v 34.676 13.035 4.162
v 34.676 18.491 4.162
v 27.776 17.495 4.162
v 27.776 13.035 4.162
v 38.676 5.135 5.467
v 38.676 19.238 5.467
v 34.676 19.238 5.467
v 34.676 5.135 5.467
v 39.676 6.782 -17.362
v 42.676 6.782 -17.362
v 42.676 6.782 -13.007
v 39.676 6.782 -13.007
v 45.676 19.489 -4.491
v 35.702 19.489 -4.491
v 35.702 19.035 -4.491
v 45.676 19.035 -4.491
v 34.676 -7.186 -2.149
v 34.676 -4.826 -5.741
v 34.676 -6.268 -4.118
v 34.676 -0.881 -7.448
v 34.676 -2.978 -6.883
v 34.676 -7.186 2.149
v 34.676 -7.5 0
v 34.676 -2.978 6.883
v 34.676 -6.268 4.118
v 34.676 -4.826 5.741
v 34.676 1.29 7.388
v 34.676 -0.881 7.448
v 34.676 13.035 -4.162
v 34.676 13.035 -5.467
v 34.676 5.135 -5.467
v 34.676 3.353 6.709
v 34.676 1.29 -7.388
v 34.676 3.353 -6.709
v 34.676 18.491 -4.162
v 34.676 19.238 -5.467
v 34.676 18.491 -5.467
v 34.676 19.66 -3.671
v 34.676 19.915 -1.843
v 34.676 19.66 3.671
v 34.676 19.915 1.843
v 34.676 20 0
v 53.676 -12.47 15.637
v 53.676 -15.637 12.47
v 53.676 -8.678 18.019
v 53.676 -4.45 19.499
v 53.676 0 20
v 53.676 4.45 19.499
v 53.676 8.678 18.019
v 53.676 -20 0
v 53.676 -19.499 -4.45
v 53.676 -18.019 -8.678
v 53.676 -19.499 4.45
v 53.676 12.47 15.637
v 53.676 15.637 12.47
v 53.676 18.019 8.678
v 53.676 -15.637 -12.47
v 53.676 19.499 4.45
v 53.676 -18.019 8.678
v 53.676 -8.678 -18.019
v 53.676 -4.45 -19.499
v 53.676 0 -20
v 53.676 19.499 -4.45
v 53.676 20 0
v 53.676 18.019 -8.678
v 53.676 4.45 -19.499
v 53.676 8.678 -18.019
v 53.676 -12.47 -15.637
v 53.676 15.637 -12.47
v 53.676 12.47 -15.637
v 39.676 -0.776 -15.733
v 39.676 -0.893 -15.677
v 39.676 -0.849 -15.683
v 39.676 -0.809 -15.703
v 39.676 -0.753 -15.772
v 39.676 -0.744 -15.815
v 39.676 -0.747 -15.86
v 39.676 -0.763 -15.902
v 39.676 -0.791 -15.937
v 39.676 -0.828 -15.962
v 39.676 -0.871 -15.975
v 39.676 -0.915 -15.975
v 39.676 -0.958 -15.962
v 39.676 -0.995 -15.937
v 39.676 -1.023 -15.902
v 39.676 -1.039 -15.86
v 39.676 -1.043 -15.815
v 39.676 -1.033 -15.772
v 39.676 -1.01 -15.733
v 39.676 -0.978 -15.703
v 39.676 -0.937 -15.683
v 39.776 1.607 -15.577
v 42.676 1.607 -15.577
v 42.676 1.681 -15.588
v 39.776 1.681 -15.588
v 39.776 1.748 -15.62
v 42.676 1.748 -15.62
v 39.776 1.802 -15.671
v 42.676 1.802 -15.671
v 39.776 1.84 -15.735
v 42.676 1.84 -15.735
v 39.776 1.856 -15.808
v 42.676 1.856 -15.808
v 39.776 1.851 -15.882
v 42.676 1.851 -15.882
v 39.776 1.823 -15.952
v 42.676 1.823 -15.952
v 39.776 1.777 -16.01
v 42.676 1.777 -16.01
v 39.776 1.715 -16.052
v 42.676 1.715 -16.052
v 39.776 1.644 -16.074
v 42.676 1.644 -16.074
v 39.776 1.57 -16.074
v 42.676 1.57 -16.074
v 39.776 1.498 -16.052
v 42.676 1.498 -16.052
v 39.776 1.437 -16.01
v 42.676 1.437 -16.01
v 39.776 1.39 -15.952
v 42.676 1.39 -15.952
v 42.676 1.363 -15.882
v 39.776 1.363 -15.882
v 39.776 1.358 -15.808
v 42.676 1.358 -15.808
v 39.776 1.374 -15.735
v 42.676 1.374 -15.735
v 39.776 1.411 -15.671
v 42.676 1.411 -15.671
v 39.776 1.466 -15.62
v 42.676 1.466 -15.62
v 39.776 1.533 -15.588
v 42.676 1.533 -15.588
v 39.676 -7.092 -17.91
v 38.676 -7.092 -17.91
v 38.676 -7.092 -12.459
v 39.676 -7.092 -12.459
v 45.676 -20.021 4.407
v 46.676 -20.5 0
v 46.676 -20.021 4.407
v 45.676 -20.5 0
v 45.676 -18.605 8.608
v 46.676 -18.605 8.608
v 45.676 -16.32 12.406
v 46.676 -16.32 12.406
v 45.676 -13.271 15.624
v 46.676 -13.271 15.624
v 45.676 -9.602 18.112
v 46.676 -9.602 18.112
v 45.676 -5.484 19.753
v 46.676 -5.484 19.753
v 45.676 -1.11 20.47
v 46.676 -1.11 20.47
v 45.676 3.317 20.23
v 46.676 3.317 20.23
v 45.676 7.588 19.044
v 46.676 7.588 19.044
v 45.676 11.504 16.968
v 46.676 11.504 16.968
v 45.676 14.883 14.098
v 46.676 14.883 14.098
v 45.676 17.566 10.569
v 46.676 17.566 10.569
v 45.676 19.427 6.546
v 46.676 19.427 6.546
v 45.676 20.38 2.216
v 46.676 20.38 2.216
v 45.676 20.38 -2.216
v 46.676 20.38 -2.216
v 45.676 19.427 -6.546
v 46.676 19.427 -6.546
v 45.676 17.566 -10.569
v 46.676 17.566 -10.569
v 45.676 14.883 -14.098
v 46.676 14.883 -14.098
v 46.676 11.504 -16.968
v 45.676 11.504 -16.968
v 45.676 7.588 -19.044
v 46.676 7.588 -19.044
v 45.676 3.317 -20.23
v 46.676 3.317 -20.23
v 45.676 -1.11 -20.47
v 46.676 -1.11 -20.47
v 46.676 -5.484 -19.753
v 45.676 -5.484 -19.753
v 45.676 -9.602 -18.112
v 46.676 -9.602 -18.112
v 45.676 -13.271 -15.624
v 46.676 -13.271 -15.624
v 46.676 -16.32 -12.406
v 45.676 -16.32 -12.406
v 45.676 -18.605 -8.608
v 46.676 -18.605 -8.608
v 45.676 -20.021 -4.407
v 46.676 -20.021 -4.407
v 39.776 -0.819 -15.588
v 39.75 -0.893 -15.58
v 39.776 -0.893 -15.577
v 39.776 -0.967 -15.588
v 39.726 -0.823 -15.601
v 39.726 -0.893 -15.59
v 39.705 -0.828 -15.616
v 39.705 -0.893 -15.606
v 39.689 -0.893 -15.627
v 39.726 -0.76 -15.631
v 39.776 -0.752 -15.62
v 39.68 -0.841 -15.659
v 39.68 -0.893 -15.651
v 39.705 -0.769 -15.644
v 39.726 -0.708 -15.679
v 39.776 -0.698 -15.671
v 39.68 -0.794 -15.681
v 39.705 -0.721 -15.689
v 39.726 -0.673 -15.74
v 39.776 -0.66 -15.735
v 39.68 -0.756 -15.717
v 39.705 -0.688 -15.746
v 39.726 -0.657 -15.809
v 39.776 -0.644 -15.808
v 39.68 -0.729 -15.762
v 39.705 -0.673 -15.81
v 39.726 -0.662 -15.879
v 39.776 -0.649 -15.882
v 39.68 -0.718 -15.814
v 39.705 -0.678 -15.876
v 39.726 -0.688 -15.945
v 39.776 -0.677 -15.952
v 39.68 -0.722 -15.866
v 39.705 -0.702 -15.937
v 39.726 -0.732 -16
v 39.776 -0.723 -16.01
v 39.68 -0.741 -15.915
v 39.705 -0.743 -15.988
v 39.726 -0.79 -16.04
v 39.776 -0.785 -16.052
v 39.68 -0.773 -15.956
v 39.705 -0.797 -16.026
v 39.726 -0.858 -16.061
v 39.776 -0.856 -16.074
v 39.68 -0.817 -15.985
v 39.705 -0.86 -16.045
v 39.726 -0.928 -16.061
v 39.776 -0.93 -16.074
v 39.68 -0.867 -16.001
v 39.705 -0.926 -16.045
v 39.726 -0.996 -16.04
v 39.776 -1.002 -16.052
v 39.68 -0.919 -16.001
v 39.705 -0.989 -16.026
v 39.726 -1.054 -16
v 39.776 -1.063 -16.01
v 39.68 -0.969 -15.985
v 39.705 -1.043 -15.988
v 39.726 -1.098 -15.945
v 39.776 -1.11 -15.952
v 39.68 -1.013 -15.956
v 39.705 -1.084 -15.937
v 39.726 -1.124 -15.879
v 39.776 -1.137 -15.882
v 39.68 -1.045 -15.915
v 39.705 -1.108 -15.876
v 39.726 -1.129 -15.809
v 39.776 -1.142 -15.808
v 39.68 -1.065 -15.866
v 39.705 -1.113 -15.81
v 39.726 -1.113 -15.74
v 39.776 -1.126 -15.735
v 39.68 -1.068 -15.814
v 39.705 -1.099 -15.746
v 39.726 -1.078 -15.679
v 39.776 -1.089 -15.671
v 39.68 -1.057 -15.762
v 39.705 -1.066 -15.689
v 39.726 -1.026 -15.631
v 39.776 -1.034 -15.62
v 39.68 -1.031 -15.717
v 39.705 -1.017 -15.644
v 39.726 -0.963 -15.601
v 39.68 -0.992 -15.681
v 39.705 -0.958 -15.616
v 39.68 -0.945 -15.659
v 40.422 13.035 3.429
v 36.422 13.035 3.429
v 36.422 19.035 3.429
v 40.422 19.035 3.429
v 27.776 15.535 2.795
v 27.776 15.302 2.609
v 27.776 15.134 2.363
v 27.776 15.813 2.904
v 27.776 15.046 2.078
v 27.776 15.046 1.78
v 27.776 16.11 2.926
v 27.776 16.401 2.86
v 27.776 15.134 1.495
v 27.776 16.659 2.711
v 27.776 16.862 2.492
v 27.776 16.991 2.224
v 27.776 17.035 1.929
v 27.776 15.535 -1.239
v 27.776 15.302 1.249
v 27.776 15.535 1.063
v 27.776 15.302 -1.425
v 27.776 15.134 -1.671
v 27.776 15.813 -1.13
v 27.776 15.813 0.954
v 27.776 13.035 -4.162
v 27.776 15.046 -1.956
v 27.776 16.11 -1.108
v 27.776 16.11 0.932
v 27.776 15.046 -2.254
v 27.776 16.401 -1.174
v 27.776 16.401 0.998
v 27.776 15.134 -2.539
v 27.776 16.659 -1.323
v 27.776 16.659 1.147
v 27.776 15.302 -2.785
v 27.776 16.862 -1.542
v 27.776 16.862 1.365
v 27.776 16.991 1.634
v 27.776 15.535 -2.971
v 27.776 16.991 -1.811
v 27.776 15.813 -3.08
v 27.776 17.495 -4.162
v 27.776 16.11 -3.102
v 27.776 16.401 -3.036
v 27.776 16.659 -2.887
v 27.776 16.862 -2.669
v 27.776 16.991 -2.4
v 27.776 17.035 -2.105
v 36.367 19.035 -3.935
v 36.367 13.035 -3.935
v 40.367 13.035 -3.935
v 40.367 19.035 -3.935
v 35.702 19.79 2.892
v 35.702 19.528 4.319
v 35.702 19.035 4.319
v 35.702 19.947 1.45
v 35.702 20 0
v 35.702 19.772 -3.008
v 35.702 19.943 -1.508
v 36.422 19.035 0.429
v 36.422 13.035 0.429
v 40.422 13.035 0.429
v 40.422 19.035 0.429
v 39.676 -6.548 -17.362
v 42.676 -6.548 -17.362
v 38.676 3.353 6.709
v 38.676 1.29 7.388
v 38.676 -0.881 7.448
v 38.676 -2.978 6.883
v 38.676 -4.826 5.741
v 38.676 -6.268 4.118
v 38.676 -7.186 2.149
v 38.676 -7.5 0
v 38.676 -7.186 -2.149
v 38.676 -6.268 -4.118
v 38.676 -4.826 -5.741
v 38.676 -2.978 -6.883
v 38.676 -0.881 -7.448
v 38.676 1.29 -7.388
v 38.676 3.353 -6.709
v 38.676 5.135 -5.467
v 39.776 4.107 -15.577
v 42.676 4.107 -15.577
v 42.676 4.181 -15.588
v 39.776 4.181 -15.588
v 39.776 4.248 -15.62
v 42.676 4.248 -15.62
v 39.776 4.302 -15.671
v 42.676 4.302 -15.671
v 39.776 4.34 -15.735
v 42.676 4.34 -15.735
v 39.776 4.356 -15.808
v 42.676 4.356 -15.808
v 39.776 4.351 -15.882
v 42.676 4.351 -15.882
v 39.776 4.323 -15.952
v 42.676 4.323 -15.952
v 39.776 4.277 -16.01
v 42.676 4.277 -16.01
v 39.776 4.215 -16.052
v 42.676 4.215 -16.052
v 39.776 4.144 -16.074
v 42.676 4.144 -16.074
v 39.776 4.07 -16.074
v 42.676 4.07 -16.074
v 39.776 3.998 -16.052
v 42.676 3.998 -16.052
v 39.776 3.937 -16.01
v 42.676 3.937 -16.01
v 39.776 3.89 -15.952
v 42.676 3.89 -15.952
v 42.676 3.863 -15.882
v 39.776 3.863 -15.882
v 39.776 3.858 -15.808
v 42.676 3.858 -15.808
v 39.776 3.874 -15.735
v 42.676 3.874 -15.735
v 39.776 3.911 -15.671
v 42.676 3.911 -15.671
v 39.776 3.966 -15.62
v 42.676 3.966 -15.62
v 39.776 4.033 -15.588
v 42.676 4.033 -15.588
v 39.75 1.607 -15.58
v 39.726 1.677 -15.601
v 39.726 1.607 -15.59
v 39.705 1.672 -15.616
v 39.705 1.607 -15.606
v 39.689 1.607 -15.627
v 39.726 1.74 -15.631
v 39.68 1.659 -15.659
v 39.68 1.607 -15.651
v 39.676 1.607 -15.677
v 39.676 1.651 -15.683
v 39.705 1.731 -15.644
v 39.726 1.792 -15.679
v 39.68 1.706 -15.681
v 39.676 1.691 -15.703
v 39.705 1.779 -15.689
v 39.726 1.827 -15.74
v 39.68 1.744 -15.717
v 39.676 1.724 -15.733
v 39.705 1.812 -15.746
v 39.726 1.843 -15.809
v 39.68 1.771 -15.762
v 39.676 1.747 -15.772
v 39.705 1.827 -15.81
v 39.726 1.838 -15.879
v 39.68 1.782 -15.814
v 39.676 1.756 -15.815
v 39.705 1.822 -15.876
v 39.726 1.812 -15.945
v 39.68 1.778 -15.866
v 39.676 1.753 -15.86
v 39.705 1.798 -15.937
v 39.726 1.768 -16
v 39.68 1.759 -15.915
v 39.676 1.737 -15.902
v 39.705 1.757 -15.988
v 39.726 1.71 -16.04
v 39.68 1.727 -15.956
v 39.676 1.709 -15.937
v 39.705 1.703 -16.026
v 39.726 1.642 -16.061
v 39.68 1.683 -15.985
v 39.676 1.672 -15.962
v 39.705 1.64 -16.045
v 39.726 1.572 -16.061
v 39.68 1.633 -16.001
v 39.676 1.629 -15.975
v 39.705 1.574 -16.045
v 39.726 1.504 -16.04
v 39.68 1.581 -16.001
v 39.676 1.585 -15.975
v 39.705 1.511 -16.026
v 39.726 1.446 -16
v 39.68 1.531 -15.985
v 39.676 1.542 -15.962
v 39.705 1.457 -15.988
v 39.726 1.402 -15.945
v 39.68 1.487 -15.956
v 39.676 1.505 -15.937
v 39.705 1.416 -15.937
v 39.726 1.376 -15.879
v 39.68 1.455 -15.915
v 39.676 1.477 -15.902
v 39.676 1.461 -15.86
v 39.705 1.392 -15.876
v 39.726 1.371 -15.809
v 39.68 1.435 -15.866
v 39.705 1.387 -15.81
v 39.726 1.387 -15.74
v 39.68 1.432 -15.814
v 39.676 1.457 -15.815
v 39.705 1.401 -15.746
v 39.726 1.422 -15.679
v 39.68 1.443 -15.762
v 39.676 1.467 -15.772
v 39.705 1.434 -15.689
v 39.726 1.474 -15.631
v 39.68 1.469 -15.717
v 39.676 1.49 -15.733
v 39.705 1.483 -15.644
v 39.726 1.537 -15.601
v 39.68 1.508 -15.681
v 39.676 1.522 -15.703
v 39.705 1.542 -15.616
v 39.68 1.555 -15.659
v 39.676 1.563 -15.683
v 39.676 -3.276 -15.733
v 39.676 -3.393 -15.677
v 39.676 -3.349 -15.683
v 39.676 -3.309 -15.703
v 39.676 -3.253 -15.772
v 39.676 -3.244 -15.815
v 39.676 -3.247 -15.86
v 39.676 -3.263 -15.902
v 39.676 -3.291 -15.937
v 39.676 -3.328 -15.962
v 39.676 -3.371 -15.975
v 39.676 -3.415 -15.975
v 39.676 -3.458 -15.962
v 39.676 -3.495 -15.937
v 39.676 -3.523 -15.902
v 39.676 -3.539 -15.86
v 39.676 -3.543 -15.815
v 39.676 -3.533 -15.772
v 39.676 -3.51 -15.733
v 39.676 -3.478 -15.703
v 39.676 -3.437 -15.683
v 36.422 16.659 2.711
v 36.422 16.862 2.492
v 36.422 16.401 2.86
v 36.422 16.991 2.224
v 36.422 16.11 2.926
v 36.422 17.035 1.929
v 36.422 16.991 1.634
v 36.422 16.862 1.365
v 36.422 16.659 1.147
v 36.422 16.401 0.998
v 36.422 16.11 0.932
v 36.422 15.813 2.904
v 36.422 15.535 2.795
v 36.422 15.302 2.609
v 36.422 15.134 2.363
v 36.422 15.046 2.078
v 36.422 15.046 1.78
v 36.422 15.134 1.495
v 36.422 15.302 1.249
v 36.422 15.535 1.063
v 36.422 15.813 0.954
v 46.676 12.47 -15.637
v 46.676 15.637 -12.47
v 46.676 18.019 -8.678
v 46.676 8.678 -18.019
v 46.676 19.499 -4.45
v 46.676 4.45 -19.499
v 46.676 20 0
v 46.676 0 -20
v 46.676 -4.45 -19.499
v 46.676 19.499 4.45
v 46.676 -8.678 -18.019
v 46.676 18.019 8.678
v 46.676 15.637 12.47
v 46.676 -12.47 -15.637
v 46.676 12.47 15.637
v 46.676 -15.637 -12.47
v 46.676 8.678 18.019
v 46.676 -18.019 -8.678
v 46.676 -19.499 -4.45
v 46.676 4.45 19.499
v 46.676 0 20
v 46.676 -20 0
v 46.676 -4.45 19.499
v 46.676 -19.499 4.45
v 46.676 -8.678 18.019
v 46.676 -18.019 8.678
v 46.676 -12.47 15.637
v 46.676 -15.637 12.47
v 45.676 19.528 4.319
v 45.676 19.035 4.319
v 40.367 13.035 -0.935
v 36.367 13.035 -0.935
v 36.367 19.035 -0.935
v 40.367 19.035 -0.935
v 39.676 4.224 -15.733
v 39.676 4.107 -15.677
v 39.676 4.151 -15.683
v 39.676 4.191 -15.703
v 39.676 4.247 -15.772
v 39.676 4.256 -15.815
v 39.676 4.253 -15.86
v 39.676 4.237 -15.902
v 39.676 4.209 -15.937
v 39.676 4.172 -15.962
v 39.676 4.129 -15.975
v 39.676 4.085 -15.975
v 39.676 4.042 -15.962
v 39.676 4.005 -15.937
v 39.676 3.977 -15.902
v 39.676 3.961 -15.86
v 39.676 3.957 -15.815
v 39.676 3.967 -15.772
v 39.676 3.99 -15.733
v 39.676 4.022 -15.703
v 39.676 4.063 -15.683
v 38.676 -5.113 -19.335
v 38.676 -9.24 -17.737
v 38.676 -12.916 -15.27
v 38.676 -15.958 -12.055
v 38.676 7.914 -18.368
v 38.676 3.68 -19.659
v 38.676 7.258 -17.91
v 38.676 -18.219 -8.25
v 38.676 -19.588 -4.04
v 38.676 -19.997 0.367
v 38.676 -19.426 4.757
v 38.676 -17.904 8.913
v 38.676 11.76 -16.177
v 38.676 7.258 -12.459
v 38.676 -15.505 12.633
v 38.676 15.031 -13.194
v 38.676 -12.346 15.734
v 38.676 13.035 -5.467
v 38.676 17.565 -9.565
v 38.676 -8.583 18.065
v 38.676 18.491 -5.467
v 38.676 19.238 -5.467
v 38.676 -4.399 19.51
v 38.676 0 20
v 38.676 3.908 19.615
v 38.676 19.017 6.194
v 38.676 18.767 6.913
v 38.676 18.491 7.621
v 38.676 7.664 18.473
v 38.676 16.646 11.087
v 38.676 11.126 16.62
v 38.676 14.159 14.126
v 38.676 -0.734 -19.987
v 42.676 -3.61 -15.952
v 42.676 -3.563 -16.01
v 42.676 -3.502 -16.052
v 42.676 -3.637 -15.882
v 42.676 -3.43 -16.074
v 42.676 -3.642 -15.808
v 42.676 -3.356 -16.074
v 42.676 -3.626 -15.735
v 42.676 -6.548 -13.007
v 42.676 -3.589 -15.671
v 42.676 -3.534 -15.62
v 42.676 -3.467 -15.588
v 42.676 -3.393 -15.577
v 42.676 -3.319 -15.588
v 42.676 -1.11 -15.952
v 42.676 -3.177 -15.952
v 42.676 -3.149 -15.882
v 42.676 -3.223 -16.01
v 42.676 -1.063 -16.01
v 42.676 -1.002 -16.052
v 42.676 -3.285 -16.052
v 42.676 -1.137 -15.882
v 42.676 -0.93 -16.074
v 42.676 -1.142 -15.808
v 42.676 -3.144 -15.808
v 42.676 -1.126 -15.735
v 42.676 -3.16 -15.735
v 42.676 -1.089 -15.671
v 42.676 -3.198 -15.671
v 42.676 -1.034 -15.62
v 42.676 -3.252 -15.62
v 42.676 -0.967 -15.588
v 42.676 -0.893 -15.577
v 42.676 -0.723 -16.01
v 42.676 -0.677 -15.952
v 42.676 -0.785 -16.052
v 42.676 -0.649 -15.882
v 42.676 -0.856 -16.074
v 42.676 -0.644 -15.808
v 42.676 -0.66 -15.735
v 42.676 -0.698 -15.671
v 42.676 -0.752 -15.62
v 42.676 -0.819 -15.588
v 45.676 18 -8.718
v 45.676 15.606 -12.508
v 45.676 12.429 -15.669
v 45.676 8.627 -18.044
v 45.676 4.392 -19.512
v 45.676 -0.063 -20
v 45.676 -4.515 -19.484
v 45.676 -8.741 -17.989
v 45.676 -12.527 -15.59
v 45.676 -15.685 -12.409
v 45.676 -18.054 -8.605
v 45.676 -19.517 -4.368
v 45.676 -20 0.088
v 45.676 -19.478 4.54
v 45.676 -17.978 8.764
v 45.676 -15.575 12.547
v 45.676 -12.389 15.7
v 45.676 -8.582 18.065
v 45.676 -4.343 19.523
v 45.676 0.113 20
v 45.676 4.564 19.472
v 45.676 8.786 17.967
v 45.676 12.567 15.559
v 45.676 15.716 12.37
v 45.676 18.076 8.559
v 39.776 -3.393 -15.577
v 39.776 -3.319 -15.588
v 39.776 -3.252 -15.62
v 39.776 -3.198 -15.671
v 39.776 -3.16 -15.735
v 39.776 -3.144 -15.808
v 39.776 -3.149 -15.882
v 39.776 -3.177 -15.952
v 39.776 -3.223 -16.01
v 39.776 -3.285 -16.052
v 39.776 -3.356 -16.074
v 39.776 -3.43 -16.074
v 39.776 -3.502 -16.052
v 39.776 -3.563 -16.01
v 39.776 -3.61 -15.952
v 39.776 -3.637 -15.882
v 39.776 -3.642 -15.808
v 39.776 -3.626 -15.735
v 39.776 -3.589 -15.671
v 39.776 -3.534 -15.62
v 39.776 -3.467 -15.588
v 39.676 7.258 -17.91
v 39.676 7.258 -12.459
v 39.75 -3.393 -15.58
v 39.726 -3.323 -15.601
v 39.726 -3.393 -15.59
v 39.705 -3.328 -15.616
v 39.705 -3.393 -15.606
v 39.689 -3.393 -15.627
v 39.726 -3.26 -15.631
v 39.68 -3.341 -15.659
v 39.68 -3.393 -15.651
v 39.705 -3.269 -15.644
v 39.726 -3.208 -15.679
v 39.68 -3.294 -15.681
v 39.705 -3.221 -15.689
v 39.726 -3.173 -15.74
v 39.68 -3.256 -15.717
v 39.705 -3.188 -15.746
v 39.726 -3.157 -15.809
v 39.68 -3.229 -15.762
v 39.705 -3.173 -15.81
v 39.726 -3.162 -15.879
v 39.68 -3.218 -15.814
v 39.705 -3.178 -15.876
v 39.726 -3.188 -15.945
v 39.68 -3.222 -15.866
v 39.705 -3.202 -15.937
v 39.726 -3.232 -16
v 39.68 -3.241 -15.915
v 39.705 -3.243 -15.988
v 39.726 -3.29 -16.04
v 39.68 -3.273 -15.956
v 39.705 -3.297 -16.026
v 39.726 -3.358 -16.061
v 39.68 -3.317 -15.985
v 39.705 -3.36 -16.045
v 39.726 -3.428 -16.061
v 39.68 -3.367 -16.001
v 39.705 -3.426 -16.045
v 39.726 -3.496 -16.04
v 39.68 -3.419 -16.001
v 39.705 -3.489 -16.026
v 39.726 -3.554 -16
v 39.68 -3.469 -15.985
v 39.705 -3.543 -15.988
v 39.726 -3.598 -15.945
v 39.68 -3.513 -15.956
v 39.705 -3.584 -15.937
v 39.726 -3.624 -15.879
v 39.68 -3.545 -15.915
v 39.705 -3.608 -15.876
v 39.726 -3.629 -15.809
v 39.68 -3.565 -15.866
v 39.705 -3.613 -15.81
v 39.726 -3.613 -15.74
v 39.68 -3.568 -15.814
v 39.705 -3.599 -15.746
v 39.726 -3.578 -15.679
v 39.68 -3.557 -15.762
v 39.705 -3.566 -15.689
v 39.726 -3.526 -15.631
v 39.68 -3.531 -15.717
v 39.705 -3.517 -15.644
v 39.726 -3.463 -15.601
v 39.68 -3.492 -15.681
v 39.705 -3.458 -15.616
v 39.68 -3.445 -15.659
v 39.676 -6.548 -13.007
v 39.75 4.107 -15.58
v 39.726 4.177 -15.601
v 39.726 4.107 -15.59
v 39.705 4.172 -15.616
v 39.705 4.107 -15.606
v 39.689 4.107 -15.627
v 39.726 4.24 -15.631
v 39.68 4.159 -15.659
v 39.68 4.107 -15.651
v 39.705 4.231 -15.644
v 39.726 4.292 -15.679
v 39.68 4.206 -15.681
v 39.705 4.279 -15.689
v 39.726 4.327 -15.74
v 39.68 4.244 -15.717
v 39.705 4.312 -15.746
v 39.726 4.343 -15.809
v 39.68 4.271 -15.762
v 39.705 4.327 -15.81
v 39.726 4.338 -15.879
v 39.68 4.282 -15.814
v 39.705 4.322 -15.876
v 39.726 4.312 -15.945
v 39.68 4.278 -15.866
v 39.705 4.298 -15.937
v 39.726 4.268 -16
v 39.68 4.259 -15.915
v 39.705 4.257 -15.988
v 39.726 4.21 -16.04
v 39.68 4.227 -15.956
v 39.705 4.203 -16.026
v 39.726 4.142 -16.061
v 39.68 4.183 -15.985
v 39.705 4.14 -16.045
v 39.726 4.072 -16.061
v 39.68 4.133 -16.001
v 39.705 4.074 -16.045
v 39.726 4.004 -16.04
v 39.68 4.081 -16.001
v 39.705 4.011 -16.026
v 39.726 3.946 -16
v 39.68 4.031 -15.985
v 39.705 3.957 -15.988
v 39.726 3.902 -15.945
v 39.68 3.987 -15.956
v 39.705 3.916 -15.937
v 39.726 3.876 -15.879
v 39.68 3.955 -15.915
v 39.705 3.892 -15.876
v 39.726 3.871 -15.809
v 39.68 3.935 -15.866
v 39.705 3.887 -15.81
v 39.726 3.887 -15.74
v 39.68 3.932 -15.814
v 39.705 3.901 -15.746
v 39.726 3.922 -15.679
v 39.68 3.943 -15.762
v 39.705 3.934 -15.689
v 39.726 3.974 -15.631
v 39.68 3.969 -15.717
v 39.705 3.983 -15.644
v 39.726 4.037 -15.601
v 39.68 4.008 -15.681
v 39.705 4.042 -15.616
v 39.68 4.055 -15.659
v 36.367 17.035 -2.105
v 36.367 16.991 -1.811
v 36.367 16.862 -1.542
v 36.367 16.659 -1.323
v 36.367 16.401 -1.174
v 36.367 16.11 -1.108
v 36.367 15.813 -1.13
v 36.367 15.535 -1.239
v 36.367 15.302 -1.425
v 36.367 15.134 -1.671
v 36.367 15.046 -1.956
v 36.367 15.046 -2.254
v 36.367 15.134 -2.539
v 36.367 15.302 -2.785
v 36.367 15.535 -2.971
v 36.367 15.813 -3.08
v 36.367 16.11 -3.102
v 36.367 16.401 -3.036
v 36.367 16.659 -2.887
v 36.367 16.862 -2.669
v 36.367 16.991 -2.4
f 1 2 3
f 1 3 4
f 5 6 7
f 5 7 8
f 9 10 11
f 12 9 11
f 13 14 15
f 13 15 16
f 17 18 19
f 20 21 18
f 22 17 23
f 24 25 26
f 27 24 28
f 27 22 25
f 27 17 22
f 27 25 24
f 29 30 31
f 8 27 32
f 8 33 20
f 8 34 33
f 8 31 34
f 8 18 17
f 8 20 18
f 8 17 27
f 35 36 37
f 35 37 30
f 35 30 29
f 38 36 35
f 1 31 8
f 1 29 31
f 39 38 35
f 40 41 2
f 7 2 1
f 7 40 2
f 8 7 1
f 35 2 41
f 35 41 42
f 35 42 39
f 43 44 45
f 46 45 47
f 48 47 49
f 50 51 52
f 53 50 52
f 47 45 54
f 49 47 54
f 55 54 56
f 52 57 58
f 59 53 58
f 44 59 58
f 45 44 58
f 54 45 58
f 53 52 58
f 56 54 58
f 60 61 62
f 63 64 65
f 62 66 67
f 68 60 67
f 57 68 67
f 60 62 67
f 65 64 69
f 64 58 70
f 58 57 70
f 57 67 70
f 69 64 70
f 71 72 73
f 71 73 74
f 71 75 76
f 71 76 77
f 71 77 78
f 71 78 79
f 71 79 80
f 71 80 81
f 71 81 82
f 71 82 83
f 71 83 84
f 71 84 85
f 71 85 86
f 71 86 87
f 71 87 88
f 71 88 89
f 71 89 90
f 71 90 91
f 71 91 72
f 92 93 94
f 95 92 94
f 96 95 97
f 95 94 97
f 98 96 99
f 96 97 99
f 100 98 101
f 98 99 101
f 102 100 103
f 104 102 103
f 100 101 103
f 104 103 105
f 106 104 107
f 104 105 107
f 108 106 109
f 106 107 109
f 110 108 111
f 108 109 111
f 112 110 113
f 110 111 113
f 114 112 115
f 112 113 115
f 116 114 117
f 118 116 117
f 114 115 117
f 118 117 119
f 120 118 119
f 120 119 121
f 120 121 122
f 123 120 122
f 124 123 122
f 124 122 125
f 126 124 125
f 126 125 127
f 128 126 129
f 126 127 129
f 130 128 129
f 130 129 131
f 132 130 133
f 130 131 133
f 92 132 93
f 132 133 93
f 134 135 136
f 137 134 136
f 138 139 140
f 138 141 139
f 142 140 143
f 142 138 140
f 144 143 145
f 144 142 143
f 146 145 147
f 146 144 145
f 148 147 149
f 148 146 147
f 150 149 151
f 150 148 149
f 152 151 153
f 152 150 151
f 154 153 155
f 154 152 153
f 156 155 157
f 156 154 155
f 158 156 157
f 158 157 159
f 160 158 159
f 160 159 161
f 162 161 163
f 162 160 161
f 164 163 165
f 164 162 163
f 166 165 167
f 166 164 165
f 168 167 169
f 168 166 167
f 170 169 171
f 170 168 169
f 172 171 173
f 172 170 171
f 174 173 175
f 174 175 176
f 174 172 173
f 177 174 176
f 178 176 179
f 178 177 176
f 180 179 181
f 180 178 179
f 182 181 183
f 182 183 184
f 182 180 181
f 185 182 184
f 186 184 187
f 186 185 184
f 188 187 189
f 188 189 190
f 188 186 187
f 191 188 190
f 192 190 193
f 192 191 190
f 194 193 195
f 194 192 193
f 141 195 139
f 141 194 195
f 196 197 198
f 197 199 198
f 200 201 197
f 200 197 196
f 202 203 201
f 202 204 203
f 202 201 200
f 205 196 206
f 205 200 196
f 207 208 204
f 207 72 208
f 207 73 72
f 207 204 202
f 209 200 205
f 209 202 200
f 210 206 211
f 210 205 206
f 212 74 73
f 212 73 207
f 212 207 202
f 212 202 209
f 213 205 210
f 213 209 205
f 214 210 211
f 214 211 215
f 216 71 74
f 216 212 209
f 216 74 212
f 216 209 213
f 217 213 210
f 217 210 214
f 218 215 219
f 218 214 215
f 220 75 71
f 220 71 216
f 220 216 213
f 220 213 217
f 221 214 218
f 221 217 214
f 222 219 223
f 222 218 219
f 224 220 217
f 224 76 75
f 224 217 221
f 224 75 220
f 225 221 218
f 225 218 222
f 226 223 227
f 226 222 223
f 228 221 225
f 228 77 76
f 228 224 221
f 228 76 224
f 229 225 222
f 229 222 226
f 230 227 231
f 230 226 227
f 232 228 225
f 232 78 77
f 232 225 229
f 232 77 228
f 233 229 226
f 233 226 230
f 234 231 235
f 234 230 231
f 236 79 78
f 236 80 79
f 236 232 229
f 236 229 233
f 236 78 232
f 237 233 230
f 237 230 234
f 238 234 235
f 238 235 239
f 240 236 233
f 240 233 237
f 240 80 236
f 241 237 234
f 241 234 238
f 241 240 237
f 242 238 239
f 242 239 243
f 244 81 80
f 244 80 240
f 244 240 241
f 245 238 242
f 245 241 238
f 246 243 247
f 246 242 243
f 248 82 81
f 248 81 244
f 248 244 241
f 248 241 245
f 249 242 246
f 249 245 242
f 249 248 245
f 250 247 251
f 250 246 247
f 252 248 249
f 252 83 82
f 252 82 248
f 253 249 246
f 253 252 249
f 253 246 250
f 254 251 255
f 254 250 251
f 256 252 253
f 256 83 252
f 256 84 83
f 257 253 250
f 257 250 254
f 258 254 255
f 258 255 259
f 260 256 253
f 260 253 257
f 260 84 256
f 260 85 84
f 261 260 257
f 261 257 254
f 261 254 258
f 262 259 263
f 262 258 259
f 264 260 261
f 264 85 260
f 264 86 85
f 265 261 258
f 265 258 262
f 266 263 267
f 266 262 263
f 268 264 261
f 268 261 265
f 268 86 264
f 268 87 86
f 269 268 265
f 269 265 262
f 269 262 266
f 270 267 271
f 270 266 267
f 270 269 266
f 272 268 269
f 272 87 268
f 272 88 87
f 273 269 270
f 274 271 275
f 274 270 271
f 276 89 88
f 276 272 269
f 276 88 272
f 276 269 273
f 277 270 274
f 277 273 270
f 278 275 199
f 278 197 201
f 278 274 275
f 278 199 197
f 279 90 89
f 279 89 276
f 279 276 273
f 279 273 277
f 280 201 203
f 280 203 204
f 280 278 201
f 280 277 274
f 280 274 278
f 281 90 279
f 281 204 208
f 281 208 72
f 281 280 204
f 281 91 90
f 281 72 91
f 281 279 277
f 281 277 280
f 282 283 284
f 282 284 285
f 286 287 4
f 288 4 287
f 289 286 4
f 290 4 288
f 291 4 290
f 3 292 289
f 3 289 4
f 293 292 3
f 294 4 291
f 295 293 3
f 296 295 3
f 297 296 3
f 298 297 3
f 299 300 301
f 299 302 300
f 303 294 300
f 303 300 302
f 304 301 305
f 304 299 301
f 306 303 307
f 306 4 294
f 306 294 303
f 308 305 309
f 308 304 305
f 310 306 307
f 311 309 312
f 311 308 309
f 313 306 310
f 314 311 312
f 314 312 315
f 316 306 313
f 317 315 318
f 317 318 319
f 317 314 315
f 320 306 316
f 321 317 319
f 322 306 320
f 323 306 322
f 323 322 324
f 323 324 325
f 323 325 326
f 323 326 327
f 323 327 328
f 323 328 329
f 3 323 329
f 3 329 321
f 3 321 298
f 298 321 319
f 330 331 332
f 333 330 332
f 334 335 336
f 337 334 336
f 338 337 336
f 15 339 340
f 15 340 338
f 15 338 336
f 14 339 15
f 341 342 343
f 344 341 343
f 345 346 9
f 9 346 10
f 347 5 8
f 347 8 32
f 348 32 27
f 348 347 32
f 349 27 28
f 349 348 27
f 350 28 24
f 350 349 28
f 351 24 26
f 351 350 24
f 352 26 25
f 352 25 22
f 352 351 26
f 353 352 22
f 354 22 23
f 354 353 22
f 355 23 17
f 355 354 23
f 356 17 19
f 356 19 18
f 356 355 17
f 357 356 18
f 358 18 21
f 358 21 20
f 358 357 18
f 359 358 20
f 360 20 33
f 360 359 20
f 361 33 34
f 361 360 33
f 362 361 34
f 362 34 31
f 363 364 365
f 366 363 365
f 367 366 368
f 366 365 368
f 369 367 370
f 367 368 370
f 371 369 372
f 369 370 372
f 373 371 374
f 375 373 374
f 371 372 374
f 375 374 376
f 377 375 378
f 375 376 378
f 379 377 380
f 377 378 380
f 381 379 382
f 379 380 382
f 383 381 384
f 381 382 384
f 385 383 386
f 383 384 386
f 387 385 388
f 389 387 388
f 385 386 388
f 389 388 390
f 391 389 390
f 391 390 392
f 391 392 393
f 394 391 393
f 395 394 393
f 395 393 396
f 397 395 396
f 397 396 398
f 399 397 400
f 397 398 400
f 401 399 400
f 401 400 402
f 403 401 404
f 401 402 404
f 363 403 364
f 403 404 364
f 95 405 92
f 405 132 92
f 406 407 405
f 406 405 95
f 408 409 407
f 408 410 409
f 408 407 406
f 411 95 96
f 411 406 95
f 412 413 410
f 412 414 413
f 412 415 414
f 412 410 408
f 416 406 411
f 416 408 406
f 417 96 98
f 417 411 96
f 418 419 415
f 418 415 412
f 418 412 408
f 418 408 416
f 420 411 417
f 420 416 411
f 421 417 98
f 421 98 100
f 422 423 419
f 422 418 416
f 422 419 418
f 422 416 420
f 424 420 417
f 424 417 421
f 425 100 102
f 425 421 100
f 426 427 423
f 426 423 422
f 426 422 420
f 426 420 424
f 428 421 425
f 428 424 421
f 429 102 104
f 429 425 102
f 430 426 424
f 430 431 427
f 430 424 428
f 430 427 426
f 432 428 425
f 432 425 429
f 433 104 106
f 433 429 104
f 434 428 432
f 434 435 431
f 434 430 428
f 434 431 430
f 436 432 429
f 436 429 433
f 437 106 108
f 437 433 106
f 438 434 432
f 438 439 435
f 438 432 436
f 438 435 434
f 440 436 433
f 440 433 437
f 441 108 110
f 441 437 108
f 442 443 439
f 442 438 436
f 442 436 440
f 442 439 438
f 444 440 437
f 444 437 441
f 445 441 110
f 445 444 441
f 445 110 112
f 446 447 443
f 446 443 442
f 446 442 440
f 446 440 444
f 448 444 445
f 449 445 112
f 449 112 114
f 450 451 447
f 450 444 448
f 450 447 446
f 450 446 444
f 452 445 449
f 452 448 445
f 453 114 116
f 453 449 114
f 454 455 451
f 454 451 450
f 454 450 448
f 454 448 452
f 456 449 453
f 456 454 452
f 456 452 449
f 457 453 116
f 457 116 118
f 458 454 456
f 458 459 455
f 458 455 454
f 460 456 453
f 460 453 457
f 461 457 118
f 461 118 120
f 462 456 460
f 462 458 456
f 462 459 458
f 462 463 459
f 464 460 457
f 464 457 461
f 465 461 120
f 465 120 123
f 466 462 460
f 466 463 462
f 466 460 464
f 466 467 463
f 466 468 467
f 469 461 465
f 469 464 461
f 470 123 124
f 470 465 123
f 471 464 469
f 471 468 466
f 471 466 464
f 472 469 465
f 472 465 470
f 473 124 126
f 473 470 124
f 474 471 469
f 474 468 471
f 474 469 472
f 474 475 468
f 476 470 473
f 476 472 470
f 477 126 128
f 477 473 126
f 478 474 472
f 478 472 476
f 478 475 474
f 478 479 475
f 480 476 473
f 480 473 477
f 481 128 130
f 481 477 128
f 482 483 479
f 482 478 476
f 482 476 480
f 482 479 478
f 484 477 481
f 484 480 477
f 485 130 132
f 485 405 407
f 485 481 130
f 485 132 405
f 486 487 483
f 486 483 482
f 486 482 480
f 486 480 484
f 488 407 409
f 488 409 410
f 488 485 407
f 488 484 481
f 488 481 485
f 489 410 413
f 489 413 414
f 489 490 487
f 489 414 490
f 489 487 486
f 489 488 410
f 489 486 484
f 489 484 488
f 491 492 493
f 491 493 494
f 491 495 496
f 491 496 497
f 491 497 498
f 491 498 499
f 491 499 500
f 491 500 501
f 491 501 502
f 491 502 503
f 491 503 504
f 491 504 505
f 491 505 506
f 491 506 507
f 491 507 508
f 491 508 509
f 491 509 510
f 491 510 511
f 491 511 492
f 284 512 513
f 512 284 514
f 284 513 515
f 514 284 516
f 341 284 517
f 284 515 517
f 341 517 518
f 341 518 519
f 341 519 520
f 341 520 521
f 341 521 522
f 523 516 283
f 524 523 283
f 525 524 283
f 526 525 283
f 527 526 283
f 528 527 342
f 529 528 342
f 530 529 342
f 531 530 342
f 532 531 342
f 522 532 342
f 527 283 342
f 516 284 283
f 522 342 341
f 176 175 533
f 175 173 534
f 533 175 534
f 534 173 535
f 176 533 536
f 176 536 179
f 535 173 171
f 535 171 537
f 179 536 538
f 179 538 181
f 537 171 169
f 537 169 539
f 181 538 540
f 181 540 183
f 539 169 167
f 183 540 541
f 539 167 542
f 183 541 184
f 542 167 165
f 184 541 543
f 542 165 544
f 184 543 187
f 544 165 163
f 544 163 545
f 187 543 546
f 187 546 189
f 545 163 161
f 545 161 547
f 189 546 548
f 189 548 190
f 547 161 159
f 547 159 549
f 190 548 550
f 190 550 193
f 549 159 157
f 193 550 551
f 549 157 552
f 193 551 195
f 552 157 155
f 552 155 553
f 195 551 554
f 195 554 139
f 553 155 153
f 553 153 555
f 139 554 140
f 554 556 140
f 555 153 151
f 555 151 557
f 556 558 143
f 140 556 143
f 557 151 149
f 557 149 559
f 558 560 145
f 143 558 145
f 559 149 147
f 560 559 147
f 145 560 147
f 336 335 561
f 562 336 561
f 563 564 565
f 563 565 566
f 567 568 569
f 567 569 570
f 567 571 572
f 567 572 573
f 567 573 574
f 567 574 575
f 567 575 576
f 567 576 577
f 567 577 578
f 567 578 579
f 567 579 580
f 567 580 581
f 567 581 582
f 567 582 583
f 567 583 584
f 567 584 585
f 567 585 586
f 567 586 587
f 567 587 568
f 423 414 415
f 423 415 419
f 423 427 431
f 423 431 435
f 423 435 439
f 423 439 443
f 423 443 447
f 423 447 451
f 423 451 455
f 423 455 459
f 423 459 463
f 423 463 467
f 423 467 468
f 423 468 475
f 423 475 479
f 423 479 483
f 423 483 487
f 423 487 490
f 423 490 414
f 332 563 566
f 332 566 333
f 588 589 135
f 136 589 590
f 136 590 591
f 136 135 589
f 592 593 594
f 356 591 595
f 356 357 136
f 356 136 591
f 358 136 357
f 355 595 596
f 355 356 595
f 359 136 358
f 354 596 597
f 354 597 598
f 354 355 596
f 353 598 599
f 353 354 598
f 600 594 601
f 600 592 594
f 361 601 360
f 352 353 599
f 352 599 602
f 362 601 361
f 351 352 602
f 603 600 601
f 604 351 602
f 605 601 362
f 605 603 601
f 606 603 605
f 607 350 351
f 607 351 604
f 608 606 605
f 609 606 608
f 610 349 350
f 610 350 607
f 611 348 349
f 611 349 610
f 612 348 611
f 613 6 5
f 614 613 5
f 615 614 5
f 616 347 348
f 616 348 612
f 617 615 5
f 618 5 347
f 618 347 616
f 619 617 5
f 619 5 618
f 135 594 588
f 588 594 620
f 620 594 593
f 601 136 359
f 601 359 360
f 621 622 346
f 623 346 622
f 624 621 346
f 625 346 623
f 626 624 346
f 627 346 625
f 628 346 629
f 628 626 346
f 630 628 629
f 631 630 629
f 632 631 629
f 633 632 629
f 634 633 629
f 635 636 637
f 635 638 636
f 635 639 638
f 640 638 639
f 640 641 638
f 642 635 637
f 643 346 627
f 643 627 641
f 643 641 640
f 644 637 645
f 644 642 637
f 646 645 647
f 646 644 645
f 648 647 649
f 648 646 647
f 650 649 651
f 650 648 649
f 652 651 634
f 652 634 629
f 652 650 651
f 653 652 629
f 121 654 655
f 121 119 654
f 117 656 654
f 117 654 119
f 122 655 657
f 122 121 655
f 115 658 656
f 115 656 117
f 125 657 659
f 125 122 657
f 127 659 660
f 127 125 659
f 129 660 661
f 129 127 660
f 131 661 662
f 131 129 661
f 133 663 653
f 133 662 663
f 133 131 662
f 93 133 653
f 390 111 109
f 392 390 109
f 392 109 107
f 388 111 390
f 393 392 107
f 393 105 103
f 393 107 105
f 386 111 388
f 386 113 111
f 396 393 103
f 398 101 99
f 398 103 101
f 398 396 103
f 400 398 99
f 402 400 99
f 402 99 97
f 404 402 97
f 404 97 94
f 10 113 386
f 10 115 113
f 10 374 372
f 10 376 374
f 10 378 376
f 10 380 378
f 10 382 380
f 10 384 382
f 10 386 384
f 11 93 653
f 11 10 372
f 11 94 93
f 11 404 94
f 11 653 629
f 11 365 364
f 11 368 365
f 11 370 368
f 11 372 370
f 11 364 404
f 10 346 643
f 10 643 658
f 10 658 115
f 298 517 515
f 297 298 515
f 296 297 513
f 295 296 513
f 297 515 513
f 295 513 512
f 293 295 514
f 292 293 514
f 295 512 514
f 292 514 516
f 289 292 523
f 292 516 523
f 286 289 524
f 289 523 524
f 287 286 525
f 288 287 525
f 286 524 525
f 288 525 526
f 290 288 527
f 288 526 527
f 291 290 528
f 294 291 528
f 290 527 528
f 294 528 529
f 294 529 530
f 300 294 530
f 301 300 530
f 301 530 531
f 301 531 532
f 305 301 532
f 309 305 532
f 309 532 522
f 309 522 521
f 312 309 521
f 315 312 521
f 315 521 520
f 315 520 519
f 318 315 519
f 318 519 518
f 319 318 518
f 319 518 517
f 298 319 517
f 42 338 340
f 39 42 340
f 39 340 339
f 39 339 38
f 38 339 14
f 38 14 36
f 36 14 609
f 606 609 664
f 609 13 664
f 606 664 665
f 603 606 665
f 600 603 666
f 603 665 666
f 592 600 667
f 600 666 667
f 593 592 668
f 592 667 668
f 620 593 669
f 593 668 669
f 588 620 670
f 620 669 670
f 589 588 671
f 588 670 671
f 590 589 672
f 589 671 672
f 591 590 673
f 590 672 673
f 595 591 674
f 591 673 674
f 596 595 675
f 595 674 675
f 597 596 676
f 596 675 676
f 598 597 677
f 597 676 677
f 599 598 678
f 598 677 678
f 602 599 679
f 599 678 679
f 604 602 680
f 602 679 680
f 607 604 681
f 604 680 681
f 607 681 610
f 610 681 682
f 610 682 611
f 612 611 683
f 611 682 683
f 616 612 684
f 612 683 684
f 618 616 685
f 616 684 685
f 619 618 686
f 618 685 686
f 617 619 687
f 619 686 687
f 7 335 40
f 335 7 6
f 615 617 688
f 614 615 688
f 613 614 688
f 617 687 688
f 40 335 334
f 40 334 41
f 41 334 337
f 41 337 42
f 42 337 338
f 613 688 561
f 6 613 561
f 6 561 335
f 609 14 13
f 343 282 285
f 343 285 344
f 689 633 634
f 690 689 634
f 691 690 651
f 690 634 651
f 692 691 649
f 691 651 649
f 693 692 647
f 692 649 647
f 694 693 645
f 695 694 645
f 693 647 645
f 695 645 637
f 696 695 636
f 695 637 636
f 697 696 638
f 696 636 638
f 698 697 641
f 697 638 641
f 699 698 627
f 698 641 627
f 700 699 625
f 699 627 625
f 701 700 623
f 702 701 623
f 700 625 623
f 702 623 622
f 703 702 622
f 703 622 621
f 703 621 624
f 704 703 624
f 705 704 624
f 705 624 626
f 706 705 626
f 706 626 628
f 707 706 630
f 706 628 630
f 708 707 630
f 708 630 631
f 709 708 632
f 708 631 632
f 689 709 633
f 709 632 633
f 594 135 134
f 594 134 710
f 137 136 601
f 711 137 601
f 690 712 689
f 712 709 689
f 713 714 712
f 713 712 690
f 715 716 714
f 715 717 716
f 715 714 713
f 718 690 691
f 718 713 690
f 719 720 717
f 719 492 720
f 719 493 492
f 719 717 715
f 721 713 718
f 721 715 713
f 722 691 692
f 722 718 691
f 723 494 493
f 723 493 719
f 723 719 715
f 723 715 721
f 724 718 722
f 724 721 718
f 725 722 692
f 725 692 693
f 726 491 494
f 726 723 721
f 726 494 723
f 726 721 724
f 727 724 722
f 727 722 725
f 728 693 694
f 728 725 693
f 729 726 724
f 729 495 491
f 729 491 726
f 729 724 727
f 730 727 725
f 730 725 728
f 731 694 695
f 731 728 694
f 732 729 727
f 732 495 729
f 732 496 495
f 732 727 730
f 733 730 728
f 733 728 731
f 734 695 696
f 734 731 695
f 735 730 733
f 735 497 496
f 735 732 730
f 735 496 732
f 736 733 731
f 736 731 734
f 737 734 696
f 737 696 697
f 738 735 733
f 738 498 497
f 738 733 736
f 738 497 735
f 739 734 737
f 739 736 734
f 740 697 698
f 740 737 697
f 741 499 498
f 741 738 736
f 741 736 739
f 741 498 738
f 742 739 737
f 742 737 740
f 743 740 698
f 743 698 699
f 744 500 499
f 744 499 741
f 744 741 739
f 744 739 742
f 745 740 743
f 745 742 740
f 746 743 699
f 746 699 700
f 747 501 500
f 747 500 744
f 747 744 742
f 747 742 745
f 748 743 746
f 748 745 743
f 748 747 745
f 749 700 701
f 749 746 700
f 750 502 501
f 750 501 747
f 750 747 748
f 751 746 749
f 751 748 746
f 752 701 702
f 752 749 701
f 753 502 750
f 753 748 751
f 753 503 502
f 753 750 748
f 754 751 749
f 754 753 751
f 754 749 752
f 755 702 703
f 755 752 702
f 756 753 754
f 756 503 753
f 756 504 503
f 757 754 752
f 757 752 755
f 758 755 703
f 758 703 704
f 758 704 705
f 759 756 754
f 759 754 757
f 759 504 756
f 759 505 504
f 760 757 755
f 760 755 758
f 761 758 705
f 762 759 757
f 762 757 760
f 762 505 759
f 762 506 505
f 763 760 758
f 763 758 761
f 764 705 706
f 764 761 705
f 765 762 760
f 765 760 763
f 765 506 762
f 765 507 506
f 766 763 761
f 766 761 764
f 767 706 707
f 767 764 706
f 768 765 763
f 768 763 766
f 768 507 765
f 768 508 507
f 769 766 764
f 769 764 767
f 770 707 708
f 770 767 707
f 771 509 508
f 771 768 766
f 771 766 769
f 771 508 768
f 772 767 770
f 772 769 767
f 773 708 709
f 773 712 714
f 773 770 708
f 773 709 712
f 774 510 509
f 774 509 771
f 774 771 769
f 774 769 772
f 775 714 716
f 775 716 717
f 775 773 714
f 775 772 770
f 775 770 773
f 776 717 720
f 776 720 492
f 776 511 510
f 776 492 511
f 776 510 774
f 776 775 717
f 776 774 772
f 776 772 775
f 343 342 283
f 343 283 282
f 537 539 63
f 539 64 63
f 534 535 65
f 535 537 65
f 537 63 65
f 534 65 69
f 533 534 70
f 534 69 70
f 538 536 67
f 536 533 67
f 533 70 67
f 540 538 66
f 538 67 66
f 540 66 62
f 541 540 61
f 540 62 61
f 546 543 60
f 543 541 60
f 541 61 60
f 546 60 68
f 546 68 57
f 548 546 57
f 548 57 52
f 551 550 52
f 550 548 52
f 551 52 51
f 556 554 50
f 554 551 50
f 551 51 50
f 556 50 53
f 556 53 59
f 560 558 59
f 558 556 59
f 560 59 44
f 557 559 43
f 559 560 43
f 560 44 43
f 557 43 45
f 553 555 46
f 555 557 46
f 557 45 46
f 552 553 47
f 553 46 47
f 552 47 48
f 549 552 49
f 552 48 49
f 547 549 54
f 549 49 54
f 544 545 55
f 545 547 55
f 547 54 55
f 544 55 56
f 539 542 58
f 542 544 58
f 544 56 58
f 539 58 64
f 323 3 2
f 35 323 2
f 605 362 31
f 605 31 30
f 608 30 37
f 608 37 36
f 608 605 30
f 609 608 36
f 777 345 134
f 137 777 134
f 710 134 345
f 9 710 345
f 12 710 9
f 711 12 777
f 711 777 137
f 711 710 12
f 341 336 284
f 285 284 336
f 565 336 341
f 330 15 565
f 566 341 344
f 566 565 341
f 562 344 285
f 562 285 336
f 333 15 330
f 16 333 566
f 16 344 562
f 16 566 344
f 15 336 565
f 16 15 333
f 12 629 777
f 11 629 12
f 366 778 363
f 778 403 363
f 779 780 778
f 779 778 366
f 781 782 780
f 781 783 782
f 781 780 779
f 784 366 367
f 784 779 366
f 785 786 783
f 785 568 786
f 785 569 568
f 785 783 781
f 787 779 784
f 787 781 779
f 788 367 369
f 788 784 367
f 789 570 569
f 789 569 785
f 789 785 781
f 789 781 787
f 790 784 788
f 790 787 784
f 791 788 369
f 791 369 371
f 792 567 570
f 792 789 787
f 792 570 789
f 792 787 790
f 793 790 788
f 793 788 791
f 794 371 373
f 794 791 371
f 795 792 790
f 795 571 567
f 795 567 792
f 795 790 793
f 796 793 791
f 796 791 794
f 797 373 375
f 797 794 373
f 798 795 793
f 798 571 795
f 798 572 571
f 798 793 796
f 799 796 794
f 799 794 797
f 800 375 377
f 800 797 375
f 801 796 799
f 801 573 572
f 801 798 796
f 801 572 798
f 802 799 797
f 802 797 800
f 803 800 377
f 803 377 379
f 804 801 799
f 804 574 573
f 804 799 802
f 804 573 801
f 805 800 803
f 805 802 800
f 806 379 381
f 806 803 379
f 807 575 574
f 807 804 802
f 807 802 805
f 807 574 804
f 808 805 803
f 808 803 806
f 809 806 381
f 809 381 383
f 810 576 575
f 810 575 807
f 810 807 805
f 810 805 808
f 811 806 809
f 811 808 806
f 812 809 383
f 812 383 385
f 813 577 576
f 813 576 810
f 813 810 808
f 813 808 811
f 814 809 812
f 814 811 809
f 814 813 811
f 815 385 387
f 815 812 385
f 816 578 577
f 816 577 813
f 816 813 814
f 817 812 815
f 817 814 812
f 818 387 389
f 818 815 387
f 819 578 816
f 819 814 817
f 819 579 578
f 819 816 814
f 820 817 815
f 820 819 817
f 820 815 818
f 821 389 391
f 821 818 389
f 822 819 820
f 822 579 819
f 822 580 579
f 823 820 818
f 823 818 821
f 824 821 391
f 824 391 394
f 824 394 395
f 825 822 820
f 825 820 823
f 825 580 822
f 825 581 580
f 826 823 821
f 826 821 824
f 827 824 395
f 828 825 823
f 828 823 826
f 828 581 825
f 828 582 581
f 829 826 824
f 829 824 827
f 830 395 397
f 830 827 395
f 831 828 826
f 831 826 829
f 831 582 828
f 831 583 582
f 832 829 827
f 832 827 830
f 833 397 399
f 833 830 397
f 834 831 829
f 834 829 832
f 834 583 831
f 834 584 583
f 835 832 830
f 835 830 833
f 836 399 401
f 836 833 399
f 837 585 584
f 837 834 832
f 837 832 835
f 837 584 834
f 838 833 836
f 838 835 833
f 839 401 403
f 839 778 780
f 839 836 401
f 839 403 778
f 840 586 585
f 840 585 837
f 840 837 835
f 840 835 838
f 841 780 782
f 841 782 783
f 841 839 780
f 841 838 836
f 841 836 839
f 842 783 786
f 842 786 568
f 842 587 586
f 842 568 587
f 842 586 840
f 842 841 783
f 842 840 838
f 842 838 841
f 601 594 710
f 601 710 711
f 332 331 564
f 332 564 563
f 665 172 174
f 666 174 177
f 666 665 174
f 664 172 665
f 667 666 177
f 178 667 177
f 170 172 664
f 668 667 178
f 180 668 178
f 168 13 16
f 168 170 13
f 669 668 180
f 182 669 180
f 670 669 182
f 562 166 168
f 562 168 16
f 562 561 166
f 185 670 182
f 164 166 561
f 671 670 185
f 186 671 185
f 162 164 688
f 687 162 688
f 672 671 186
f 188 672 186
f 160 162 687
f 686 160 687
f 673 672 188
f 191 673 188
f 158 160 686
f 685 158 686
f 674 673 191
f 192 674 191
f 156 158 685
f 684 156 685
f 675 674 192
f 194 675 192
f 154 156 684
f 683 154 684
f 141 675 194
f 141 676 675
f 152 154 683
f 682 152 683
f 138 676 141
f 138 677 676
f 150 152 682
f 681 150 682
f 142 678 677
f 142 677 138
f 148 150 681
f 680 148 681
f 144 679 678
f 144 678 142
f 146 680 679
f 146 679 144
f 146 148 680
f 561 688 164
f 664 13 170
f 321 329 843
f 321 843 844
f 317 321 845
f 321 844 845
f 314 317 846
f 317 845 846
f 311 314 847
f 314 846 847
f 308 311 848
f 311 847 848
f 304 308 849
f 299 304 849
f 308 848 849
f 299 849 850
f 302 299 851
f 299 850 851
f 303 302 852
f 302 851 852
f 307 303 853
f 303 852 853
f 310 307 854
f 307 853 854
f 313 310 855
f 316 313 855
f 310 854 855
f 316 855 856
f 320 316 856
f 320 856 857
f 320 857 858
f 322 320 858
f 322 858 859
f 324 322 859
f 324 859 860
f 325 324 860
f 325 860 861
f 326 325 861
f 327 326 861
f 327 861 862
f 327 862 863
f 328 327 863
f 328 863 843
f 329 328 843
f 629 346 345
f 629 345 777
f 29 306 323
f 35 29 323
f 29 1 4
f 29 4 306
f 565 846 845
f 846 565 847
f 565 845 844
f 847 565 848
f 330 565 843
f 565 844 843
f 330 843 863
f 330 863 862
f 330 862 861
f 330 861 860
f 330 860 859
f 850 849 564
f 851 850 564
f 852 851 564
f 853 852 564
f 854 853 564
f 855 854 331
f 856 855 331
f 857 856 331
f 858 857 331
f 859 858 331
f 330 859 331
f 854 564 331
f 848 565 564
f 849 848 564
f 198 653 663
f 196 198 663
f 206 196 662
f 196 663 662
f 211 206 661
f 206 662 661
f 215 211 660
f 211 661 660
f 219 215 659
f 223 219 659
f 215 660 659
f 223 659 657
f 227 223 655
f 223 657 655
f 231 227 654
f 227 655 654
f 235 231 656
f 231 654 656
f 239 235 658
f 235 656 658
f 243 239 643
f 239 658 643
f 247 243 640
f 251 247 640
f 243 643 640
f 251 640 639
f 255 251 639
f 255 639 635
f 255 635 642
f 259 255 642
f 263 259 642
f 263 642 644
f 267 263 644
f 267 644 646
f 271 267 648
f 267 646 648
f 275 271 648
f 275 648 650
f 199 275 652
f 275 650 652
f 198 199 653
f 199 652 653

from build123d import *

# Parameters (mm, degrees)
SKETCH1_W           = 25.9
SKETCH1_H           = 20
CUT_EXTRUDE1_START  = -6.9
CUT_EXTRUDE1_DEPTH  = 6.9
CUT_EXTRUDE3_DEPTH  = 37.9
CUT_EXTRUDE4_START  = -4
CUT_EXTRUDE4_DEPTH  = 4
SKETCH5_W           = 3.079292118
SKETCH5_H           = 1.929571357
SKETCH5_H_2         = 4.46
SKETCH5_W_2         = 3.459055715
CUT_EXTRUDE5_DEPTH  = 6.9
CUT_EXTRUDE6_START  = -4
SKETCH6_W           = 1.774907729
SKETCH6_H           = 5.455649351
CUT_EXTRUDE6_DEPTH  = 4
SKETCH7_R           = 20.5
BOSS_EXTRUDE1_DEPTH = 0.5
SKETCH8_W           = 5.450728154
SKETCH8_H           = 14.349876159
CUT_EXTRUDE7_DEPTH  = 4
SKETCH9_W           = 5.450728154
SKETCH9_H           = 14.349876159
SKETCH9_W_2         = 4.355367047
SKETCH9_H_2         = 13.330062778
BOSS_EXTRUDE2_DEPTH = 3
SKETCH10_R          = 0.25
BOSS_EXTRUDE3_DEPTH = 3
FILLET1_R           = 0.1
FILLET2_R           = 0.1
FILLET3_R           = 0.1
FILLET4_R           = 0.1
SKETCH11_W          = 9.973758266
SKETCH11_H          = 8.809863574
CUT_EXTRUDE8_DEPTH  = 6.964735979
SKETCH12_W          = 9.973758266
SKETCH12_H          = 8.809863574
SKETCH12_W_2        = 4
SKETCH12_H_2        = 3
BOSS_EXTRUDE4_DEPTH = 6
SKETCH14_R          = 1
CUT_EXTRUDE9_DEPTH  = 12


with BuildPart() as part:
    # Sketch1 → Revolve1 (revolve)
    with BuildSketch(Plane.XY, mode=Mode.PRIVATE) as revolve1_sk:
        with Locations((40.726102109, -10)):
            Rectangle(SKETCH1_W, SKETCH1_H)
    revolve(revolve1_sk.sketch.rotate(Axis((71.094105119, 0, 0), (-1, 0, 0)), 180), axis=Axis((71.094105119, 0, 0), (-1, 0, 0)))

    # Sketch2 → Cut-Extrude1 (cut)
    with BuildSketch(Plane.ZY.offset(-27.776102109).offset(CUT_EXTRUDE1_START)):
        with BuildLine():
            ThreePointArc((7.621425239, 18.490913372), (0.204527107, 19.998954189), (-7.241661642, 18.642916528))
            Line((-7.241661642, 18.642916528), (7.621425239, 18.490913372))
        make_face()
        with BuildLine():
            Line((-7.241661642, 13.035264021), (-7.241661642, 18.642916528))
            ThreePointArc((-7.241661642, 18.642916528), (-11.295281474, -16.50504821), (20, 0))
            ThreePointArc((20, 0), (16.619694714, 11.12590435), (7.621425239, 18.490913372))
            Line((7.621425239, 18.490913372), (7.621425239, 13.035264021))
            Line((7.621425239, 13.035264021), (-7.241661642, 13.035264021))
        make_face()
    extrude(amount=CUT_EXTRUDE1_DEPTH, mode=Mode.SUBTRACT)

    # Sketch3 → Cut-Extrude3 (cut)
    with BuildSketch(Plane.XY.offset(7.621425239)):
        Polygon((27.776102109, 17.495264021), (34.676102109, 18.490913372), (27.776102109, 18.490913372), align=None)
        Polygon((27.776102109, 18.490913372), (34.676102109, 18.490913372), (34.676102109, 18.667614819), (27.776102109, 19.075412015), align=None)
    extrude(amount=-CUT_EXTRUDE3_DEPTH, mode=Mode.SUBTRACT)

    # Sketch4 → Cut-Extrude4 (cut)
    with BuildSketch(Plane.ZY.offset(-34.676102109).offset(CUT_EXTRUDE4_START)):
        with BuildLine():
            ThreePointArc((5.466753913, 5.13464718), (0, -7.5), (-5.466753913, 5.13464718))
            Line((-5.466753913, 5.13464718), (-5.466753913, 13.035264021))
            Line((-5.466753913, 13.035264021), (-7.241661642, 13.035264021))
            Line((-7.241661642, 13.035264021), (-7.241661642, 18.490913372))
            Line((-7.241661642, 18.490913372), (-5.466753913, 18.490913372))
            Line((-5.466753913, 18.490913372), (-5.466753913, 19.238362759))
            ThreePointArc((-5.466753913, 19.238362759), (-12.055391361, -15.958306274), (20, 0))
            ThreePointArc((20, 0), (16.619694714, 11.12590435), (7.621425239, 18.490913372))
            Line((7.621425239, 18.490913372), (7.621425239, 13.035264021))
            Line((7.621425239, 13.035264021), (5.466753913, 13.035264021))
            Line((5.466753913, 13.035264021), (5.466753913, 5.13464718))
        make_face()
    extrude(amount=CUT_EXTRUDE4_DEPTH, mode=Mode.SUBTRACT)

    # Sketch5 → Cut-Extrude5 (cut)
    with BuildSketch(Plane.ZY.offset(-27.776102109)):
        with Locations((-5.702015583, 18.4600497)):
            Rectangle(SKETCH5_W, SKETCH5_H)
        with Locations((-5.702015583, 15.265264021)):
            Rectangle(SKETCH5_W, SKETCH5_H_2)
        with Locations((5.891897381, 18.4600497)):
            Rectangle(SKETCH5_W_2, SKETCH5_H)
        with Locations((5.891897381, 15.265264021)):
            Rectangle(SKETCH5_W_2, SKETCH5_H_2)
    extrude(amount=-CUT_EXTRUDE5_DEPTH, mode=Mode.SUBTRACT)

    # Sketch6 → Cut-Extrude6 (cut)
    with BuildSketch(Plane.ZY.offset(-34.676102109).offset(CUT_EXTRUDE6_START)):
        with BuildLine():
            Line((5.466753913, 19.238362759), (5.466753913, 13.035264021))
            Line((5.466753913, 13.035264021), (7.621425239, 13.035264021))
            Line((7.621425239, 13.035264021), (7.621425239, 18.490913372))
            ThreePointArc((7.621425239, 18.490913372), (6.554752362, 18.895375664), (5.466753913, 19.238362759))
        make_face()
        with Locations((-6.354207778, 15.763088697)):
            Rectangle(SKETCH6_W, SKETCH6_H)
    extrude(amount=CUT_EXTRUDE6_DEPTH, mode=Mode.SUBTRACT)

    # Sketch7 → Boss-Extrude1 (add, symmetric)
    with BuildSketch(Plane.ZY.offset(-46.176102109)):
        with Locations(Location((0, 0, 0), (0, 0, 270))):
            Circle(SKETCH7_R)
    extrude(amount=BOSS_EXTRUDE1_DEPTH, both=True)

    # Sketch8 → Cut-Extrude7 (cut)
    with BuildSketch(Plane.ZY.offset(-38.676102109)):
        with Locations((-15.184171285, 0.083429512)):
            Rectangle(SKETCH8_W, SKETCH8_H)
    extrude(amount=-CUT_EXTRUDE7_DEPTH, mode=Mode.SUBTRACT)

    # Sketch9 → Boss-Extrude2 (add)
    with BuildSketch(Plane.ZY.offset(-42.676102109)):
        with Locations((-15.184171285, 0.083429512)):
            Rectangle(SKETCH9_W, SKETCH9_H)
        with Locations((-15.184204235, 0.116814581)):
            Rectangle(SKETCH9_W_2, SKETCH9_H_2, mode=Mode.SUBTRACT)
    extrude(amount=BOSS_EXTRUDE2_DEPTH)

    # Sketch10 → Boss-Extrude3 (add)
    with BuildSketch(Plane.ZY.offset(-42.676102109)):
        with Locations((-15.826659994, 4.106898055)):
            Circle(SKETCH10_R)
        with Locations((-15.826659994, 1.606898055)):
            Circle(SKETCH10_R)
        with Locations((-15.826659994, -3.393101945)):
            Circle(SKETCH10_R)
        with Locations((-15.826659994, -0.893101945)):
            Circle(SKETCH10_R)
    extrude(amount=BOSS_EXTRUDE3_DEPTH)

    # Fillet1
    fillet1_edges = [part.edges().sort_by_distance(p)[0] for p in [
        (39.676102109, 4.106898055, -16.076659994),
    ]]
    fillet(fillet1_edges, radius=FILLET1_R)

    # Fillet2
    fillet2_edges = [part.edges().sort_by_distance(p)[0] for p in [
        (39.676102109, 1.606898055, -16.076659994),
    ]]
    fillet(fillet2_edges, radius=FILLET2_R)

    # Fillet3
    fillet3_edges = [part.edges().sort_by_distance(p)[0] for p in [
        (39.676102109, -0.893101945, -16.076659994),
    ]]
    fillet(fillet3_edges, radius=FILLET3_R)

    # Fillet4
    fillet4_edges = [part.edges().sort_by_distance(p)[0] for p in [
        (39.676102109, -3.393101945, -16.076659994),
    ]]
    fillet(fillet4_edges, radius=FILLET4_R)

    # Sketch11 → Cut-Extrude8 (cut)
    with BuildSketch(Plane(origin=(0, 20, 0), x_dir=(1, 0, 0), z_dir=(0, 1, 0))):
        with Locations((40.689222976, 0.086069267)):
            Rectangle(SKETCH11_W, SKETCH11_H)
    extrude(amount=-CUT_EXTRUDE8_DEPTH, mode=Mode.SUBTRACT)

    # Sketch12 → Boss-Extrude4 (add)
    with BuildSketch(Plane(origin=(0, 13.035264021, 0), x_dir=(1, 0, 0), z_dir=(0, 1, 0))):
        with Locations((40.689222976, 0.086069267)):
            Rectangle(SKETCH12_W, SKETCH12_H)
        with Locations((38.421750687, -1.928820044)):
            Rectangle(SKETCH12_W_2, SKETCH12_H_2, mode=Mode.SUBTRACT)
        with Locations((38.366922829, 2.435416113)):
            Rectangle(SKETCH12_W_2, SKETCH12_H_2, mode=Mode.SUBTRACT)
    extrude(amount=BOSS_EXTRUDE4_DEPTH)

    # Sketch14 → Cut-Extrude9 (cut)
    with BuildSketch(Plane(origin=(36.421750687, 0, 0), x_dir=(0, 0, -1), z_dir=(1, 0, 0))):
        with Locations(Location((-1.928820044, 16.035264021, 0), (0, 0, 90))):
            Circle(SKETCH14_R)
        with Locations(Location((2.105292071, 16.035264021, 0), (0, 0, 90))):
            Circle(SKETCH14_R)
    extrude(amount=-CUT_EXTRUDE9_DEPTH, mode=Mode.SUBTRACT)


solid = part.part
